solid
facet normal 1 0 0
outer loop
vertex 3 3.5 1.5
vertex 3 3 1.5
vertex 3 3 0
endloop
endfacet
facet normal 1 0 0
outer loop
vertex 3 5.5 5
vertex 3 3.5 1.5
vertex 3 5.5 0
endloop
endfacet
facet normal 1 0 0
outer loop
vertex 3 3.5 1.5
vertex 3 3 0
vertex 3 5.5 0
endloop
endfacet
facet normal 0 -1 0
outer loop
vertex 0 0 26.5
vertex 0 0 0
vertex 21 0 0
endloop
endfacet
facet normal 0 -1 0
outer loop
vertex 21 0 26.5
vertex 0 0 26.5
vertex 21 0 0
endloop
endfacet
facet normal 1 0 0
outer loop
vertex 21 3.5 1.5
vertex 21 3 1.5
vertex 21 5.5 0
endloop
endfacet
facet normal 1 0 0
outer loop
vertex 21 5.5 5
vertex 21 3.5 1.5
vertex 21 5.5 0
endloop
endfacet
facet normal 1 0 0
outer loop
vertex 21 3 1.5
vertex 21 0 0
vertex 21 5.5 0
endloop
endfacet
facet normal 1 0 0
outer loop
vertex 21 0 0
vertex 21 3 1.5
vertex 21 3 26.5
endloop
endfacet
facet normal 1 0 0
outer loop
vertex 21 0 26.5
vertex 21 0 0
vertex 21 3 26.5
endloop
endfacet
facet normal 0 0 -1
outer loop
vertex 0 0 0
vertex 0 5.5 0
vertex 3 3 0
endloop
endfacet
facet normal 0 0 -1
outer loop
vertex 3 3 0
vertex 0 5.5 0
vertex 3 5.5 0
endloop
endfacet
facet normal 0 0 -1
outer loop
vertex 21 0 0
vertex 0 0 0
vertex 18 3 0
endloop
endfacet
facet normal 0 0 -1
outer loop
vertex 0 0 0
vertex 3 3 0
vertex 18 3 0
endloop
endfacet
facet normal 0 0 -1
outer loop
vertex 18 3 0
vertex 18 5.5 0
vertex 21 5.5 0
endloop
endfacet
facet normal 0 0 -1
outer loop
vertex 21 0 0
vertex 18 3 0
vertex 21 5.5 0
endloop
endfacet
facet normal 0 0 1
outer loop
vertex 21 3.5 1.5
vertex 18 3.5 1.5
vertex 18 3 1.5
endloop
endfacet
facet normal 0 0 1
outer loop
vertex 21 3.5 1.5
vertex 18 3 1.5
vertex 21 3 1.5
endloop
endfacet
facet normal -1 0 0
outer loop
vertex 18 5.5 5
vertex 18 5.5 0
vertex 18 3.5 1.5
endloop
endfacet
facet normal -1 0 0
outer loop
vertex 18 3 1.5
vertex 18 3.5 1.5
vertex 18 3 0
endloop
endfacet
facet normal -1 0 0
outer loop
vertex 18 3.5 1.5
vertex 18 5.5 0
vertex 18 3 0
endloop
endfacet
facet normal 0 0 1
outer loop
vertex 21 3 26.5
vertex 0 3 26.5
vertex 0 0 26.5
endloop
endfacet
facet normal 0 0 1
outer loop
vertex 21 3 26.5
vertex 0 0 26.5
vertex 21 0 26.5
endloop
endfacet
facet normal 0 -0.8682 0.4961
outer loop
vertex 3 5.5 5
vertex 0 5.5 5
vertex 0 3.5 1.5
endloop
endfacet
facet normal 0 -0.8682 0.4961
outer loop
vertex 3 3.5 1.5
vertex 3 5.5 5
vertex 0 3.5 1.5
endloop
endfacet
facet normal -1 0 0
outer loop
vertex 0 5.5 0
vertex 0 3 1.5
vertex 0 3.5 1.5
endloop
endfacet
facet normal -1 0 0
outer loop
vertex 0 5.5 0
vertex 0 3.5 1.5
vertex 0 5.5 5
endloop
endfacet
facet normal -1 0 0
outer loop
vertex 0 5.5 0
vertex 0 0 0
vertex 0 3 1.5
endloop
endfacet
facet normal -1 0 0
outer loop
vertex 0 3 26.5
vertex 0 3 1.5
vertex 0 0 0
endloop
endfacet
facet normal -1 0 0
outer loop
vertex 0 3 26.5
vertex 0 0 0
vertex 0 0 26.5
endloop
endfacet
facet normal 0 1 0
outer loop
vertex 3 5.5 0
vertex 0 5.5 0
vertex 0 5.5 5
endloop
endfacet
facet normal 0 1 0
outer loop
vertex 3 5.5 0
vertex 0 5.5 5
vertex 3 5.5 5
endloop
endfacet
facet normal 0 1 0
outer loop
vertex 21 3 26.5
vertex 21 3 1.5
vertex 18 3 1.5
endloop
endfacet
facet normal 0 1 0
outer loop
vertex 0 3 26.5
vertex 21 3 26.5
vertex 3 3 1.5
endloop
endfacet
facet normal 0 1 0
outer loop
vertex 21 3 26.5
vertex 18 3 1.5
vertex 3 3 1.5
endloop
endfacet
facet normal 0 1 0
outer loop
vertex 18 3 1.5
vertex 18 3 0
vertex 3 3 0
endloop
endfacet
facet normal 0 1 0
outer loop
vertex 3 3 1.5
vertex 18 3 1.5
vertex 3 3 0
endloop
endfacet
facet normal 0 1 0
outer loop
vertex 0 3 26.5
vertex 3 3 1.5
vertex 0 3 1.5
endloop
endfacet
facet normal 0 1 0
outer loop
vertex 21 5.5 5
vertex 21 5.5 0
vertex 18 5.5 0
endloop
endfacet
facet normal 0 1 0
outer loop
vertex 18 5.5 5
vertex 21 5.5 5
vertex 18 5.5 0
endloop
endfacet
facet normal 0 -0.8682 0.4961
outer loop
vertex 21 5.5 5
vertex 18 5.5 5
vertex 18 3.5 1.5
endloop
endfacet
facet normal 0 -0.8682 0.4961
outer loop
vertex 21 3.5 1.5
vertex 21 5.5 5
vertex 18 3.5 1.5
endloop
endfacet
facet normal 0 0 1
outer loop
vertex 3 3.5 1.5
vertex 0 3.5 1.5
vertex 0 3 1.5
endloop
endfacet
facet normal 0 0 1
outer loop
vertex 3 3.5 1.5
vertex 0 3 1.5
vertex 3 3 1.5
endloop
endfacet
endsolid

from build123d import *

# Parameters (mm, degrees)
F1_DEPTH = 1.5
F3_DEPTH = 25
F2_W     = 3
F2_H     = 2
F2_W_2   = 21
F2_H_2   = 3
F4_DEPTH = 3.5
F6_DEPTH = 127


with BuildPart() as f1:
    # F0 (on Top) → F1 (new body)
    with BuildSketch(Plane.XY):
        Polygon((0, 5.5), (0, 0), (21, 0), (21, 5.5), (18, 5.5), (18, 3), (3, 3), (3, 5.5), align=None)
    extrude(amount=F1_DEPTH)

    # F2 (on face) → F3 (join)
    with BuildSketch(Plane.XY.offset(1.5)):
        Polygon((3, 3), (0, 3), (0, 0), (21, 0), (21, 3), (18, 3), align=None)
    extrude(amount=F3_DEPTH)

    # F2 (on face) → F4 (join)
    with BuildSketch(Plane.XY.offset(1.5)):
        with Locations((1.5, 4.5)):
            Rectangle(F2_W, F2_H)
        with Locations((19.5, 4.5)):
            Rectangle(F2_W, F2_H)
        with Locations((10.5, 1.5)):
            Rectangle(F2_W_2, F2_H_2)
    extrude(amount=F4_DEPTH)

    # F5 (on face) → F6 (cut)
    with BuildSketch(Plane(origin=(0, 0, 0), x_dir=(0, -1, 0), z_dir=(-1, 0, 0))):
        Polygon((-3.5, 5), (-5.5, 5), (-3.5, 1.5), align=None)
    extrude(amount=-F6_DEPTH, mode=Mode.SUBTRACT)


solid = f1.part
